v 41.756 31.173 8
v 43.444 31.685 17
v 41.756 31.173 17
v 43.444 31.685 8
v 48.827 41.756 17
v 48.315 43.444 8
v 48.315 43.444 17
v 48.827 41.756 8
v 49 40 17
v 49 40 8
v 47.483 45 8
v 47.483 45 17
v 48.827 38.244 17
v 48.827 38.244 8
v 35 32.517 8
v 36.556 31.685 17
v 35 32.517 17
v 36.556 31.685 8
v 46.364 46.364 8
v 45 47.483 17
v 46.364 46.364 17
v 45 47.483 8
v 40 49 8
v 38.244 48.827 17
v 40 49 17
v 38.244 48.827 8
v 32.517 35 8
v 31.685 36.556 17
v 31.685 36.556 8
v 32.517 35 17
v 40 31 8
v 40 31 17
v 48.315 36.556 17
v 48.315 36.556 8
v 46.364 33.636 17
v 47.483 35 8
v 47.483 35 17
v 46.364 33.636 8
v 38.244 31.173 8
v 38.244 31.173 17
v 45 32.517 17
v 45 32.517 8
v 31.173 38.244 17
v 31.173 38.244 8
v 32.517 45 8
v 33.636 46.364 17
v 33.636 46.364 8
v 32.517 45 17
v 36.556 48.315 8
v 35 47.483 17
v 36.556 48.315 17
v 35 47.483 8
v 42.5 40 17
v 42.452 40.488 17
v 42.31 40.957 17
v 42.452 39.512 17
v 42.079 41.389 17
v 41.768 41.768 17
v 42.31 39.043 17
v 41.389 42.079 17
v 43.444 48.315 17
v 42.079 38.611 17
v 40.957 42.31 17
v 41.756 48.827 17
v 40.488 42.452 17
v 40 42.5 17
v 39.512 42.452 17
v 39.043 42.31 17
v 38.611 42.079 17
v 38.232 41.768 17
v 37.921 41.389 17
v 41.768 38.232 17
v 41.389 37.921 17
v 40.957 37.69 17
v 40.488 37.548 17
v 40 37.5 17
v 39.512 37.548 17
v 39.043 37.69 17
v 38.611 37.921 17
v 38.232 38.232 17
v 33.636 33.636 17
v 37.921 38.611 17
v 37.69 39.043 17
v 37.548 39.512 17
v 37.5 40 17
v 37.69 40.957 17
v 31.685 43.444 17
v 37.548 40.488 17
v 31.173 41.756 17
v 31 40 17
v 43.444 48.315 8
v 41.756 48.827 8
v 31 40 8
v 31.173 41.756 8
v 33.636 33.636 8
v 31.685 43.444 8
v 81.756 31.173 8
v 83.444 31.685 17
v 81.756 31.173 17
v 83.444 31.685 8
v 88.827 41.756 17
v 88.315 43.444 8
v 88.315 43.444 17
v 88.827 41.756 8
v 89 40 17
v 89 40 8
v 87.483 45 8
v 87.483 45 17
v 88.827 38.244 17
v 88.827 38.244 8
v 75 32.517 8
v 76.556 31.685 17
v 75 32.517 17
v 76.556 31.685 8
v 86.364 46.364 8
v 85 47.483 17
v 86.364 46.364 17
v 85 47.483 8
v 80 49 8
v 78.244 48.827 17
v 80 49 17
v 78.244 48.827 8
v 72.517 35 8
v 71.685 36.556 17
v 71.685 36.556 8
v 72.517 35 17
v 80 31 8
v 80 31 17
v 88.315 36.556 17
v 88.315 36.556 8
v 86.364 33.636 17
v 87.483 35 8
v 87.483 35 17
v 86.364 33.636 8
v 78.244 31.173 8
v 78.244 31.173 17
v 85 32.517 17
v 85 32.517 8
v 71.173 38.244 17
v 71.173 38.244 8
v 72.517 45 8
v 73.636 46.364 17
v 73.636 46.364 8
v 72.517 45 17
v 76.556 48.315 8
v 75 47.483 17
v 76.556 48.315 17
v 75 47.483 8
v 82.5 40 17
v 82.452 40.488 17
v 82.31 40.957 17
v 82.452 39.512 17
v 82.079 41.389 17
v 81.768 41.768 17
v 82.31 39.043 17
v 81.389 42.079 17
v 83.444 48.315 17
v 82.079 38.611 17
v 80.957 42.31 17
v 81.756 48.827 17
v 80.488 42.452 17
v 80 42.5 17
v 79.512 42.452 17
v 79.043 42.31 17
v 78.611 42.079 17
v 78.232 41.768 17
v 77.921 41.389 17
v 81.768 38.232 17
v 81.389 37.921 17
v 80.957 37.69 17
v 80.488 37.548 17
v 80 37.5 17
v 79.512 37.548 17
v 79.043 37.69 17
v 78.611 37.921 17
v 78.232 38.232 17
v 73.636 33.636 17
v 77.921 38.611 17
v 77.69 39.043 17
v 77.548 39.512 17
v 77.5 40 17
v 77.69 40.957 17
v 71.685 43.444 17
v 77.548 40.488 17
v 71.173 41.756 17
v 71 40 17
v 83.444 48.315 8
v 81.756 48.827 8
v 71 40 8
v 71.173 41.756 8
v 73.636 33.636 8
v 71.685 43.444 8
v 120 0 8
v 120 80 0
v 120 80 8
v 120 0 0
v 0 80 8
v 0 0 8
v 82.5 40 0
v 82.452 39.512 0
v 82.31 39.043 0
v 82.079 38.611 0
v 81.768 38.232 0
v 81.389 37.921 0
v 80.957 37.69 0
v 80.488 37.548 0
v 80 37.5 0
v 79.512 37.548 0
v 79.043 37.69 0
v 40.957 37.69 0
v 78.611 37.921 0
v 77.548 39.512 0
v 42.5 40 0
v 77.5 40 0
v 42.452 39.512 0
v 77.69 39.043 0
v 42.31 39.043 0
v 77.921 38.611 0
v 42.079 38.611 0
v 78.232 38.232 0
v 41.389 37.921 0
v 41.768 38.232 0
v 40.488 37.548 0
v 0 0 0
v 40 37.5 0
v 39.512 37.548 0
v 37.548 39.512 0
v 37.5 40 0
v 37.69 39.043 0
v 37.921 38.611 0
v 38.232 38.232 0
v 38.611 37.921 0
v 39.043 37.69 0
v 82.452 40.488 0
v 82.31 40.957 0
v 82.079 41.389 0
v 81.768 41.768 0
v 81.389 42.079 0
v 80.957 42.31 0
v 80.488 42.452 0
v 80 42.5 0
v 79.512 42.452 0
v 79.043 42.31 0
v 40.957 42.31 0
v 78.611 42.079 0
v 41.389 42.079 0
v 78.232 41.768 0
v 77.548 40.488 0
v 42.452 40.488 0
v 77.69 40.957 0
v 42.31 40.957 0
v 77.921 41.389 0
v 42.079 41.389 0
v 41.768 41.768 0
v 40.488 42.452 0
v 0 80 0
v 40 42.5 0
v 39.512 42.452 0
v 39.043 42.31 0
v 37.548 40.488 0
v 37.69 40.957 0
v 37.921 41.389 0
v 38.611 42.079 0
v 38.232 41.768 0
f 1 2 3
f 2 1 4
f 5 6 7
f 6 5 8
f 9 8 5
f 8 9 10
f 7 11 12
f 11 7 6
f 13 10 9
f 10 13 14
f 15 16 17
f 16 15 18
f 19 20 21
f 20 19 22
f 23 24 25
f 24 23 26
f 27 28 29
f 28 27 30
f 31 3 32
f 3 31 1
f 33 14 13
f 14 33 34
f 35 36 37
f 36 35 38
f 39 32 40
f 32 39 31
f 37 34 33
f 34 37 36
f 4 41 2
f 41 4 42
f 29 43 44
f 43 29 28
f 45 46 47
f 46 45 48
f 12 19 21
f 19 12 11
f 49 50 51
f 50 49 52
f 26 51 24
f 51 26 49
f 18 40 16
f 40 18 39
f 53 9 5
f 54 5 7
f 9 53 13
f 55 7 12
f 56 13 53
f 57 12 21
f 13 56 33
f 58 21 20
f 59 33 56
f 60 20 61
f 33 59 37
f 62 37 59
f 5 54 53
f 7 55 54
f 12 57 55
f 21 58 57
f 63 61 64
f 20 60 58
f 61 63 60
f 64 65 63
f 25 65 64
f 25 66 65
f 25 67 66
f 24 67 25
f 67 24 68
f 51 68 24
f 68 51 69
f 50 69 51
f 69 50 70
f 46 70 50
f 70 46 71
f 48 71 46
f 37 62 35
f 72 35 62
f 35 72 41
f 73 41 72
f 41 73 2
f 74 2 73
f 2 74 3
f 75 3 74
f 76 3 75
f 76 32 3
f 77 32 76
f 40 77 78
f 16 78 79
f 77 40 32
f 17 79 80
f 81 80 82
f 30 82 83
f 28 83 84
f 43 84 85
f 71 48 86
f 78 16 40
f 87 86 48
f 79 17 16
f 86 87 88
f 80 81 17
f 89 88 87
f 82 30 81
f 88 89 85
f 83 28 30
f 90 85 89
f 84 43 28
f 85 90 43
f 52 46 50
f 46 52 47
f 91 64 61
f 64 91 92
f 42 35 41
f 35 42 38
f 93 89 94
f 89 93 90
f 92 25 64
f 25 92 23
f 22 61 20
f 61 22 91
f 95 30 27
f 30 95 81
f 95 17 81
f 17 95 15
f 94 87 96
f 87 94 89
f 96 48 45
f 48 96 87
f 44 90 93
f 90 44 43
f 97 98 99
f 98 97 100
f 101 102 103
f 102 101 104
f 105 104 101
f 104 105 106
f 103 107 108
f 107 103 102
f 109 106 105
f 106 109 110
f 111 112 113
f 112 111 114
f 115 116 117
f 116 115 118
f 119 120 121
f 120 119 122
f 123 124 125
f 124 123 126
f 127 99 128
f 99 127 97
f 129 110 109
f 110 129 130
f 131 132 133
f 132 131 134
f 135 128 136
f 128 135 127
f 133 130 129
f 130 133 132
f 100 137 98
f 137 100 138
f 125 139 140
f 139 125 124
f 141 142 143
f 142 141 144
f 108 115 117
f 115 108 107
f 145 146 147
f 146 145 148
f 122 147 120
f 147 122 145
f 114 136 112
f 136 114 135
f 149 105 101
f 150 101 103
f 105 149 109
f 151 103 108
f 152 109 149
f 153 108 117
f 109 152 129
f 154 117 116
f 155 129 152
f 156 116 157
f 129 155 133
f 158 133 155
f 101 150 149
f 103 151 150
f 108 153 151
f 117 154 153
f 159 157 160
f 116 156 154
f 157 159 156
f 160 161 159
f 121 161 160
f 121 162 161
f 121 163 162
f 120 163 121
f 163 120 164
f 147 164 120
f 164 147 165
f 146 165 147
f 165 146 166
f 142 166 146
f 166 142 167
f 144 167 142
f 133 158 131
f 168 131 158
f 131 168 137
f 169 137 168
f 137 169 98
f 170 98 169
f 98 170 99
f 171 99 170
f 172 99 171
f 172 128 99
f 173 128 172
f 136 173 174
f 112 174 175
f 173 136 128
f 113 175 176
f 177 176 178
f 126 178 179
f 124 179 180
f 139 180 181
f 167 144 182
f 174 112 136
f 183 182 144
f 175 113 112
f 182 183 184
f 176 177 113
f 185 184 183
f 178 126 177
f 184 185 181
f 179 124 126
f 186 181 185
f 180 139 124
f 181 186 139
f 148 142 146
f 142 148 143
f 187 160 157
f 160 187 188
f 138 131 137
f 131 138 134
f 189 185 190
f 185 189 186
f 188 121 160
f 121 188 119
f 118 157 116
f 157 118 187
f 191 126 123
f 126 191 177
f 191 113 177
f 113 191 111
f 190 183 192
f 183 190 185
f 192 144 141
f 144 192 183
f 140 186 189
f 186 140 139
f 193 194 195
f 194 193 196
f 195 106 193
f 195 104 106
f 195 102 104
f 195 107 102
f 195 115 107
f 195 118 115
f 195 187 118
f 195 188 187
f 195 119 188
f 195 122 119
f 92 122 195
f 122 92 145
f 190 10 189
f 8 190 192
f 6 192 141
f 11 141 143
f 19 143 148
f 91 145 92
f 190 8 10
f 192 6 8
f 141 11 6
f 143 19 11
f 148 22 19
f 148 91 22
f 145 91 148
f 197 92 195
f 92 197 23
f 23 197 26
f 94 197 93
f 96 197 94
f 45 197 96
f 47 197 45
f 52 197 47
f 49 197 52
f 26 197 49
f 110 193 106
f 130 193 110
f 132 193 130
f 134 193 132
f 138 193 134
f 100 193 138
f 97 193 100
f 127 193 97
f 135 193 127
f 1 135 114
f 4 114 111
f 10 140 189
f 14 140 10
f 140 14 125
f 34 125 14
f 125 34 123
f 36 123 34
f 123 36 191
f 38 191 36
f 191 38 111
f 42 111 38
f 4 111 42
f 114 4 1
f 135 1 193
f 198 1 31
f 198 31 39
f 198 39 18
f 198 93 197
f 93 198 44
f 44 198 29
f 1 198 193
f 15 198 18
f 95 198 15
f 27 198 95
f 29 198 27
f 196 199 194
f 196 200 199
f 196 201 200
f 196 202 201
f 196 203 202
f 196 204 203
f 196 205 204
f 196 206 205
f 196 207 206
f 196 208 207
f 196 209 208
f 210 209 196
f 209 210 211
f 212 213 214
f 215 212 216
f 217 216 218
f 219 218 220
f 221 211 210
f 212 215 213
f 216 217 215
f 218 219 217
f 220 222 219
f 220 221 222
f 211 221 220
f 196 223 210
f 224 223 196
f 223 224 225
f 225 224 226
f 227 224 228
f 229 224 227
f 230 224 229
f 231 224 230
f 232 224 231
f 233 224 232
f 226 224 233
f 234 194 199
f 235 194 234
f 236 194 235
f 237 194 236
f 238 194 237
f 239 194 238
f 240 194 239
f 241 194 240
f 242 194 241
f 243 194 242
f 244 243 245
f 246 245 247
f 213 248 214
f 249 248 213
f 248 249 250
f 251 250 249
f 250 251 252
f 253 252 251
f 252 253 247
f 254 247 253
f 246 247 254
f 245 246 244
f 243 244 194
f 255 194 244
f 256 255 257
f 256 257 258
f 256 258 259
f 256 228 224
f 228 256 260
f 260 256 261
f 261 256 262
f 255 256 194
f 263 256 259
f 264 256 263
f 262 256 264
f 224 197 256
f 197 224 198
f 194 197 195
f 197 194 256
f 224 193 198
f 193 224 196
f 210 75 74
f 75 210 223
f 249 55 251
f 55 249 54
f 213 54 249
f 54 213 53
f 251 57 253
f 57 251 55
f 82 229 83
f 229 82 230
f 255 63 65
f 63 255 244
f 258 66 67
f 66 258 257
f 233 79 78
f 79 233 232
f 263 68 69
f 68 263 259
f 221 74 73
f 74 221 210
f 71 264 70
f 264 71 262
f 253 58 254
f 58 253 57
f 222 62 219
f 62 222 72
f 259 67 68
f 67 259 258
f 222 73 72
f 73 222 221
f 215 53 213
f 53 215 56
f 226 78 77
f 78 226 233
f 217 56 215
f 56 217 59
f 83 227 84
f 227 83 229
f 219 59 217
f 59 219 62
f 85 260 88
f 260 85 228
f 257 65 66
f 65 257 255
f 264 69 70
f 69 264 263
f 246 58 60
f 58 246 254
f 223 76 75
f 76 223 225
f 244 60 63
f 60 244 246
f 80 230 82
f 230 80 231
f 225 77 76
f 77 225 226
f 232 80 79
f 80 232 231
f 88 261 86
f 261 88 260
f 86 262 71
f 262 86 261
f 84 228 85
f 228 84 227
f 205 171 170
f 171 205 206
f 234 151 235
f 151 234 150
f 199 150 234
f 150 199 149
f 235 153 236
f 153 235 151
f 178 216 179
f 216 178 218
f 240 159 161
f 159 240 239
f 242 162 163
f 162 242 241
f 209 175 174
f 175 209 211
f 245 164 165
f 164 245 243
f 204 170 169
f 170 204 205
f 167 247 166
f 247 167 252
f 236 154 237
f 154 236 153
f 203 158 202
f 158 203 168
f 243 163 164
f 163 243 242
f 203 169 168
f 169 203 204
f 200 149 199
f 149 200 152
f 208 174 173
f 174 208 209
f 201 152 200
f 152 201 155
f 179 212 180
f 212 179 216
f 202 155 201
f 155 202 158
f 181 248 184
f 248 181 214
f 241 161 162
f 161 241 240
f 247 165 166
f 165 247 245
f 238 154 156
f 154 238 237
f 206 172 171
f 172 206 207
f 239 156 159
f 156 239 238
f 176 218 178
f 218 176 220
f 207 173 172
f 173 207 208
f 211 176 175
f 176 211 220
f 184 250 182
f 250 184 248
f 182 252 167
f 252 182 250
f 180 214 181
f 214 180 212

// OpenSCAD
$fn = 32;

// ----------------------------------------------------------------------
// Drill jig: two_boss jig
// ----------------------------------------------------------------------

// --- parameters (mm) ---
plate_l = 120;            // plate length, X
plate_w = 80;             // plate width, Y
plate_t = 8;              // plate thickness
boss_d = 18;              // guide boss diameter
boss_h = 10;              // boss height above the plate
guide_d = 5;              // guide hole diameter
boss_pitch = 40;          // boss pitch
fit_tol = 0.1;            // tolerance for press fits, mm
free_tol = 0.3;           // tolerance for clearance fits, mm

n_boss = 2;  // guide bosses
boss_x0 = (plate_l - (n_boss - 1) * boss_pitch) / 2;  // first boss X
boss_top = plate_t - 1 + boss_h;  // boss crown height
total_h = boss_top;  // overall height

difference() {
  union() {
  cube([plate_l, plate_w, plate_t]);
  for (i = [0 : n_boss - 1])
    translate([boss_x0 + i * boss_pitch, plate_w / 2, plate_t - 1])
      cylinder(h = boss_h, d = boss_d);
  }
  for (i = [0 : n_boss - 1])
    translate([boss_x0 + i * boss_pitch, plate_w / 2, -1])
      cylinder(h = plate_t + boss_h, d = guide_d);
}
